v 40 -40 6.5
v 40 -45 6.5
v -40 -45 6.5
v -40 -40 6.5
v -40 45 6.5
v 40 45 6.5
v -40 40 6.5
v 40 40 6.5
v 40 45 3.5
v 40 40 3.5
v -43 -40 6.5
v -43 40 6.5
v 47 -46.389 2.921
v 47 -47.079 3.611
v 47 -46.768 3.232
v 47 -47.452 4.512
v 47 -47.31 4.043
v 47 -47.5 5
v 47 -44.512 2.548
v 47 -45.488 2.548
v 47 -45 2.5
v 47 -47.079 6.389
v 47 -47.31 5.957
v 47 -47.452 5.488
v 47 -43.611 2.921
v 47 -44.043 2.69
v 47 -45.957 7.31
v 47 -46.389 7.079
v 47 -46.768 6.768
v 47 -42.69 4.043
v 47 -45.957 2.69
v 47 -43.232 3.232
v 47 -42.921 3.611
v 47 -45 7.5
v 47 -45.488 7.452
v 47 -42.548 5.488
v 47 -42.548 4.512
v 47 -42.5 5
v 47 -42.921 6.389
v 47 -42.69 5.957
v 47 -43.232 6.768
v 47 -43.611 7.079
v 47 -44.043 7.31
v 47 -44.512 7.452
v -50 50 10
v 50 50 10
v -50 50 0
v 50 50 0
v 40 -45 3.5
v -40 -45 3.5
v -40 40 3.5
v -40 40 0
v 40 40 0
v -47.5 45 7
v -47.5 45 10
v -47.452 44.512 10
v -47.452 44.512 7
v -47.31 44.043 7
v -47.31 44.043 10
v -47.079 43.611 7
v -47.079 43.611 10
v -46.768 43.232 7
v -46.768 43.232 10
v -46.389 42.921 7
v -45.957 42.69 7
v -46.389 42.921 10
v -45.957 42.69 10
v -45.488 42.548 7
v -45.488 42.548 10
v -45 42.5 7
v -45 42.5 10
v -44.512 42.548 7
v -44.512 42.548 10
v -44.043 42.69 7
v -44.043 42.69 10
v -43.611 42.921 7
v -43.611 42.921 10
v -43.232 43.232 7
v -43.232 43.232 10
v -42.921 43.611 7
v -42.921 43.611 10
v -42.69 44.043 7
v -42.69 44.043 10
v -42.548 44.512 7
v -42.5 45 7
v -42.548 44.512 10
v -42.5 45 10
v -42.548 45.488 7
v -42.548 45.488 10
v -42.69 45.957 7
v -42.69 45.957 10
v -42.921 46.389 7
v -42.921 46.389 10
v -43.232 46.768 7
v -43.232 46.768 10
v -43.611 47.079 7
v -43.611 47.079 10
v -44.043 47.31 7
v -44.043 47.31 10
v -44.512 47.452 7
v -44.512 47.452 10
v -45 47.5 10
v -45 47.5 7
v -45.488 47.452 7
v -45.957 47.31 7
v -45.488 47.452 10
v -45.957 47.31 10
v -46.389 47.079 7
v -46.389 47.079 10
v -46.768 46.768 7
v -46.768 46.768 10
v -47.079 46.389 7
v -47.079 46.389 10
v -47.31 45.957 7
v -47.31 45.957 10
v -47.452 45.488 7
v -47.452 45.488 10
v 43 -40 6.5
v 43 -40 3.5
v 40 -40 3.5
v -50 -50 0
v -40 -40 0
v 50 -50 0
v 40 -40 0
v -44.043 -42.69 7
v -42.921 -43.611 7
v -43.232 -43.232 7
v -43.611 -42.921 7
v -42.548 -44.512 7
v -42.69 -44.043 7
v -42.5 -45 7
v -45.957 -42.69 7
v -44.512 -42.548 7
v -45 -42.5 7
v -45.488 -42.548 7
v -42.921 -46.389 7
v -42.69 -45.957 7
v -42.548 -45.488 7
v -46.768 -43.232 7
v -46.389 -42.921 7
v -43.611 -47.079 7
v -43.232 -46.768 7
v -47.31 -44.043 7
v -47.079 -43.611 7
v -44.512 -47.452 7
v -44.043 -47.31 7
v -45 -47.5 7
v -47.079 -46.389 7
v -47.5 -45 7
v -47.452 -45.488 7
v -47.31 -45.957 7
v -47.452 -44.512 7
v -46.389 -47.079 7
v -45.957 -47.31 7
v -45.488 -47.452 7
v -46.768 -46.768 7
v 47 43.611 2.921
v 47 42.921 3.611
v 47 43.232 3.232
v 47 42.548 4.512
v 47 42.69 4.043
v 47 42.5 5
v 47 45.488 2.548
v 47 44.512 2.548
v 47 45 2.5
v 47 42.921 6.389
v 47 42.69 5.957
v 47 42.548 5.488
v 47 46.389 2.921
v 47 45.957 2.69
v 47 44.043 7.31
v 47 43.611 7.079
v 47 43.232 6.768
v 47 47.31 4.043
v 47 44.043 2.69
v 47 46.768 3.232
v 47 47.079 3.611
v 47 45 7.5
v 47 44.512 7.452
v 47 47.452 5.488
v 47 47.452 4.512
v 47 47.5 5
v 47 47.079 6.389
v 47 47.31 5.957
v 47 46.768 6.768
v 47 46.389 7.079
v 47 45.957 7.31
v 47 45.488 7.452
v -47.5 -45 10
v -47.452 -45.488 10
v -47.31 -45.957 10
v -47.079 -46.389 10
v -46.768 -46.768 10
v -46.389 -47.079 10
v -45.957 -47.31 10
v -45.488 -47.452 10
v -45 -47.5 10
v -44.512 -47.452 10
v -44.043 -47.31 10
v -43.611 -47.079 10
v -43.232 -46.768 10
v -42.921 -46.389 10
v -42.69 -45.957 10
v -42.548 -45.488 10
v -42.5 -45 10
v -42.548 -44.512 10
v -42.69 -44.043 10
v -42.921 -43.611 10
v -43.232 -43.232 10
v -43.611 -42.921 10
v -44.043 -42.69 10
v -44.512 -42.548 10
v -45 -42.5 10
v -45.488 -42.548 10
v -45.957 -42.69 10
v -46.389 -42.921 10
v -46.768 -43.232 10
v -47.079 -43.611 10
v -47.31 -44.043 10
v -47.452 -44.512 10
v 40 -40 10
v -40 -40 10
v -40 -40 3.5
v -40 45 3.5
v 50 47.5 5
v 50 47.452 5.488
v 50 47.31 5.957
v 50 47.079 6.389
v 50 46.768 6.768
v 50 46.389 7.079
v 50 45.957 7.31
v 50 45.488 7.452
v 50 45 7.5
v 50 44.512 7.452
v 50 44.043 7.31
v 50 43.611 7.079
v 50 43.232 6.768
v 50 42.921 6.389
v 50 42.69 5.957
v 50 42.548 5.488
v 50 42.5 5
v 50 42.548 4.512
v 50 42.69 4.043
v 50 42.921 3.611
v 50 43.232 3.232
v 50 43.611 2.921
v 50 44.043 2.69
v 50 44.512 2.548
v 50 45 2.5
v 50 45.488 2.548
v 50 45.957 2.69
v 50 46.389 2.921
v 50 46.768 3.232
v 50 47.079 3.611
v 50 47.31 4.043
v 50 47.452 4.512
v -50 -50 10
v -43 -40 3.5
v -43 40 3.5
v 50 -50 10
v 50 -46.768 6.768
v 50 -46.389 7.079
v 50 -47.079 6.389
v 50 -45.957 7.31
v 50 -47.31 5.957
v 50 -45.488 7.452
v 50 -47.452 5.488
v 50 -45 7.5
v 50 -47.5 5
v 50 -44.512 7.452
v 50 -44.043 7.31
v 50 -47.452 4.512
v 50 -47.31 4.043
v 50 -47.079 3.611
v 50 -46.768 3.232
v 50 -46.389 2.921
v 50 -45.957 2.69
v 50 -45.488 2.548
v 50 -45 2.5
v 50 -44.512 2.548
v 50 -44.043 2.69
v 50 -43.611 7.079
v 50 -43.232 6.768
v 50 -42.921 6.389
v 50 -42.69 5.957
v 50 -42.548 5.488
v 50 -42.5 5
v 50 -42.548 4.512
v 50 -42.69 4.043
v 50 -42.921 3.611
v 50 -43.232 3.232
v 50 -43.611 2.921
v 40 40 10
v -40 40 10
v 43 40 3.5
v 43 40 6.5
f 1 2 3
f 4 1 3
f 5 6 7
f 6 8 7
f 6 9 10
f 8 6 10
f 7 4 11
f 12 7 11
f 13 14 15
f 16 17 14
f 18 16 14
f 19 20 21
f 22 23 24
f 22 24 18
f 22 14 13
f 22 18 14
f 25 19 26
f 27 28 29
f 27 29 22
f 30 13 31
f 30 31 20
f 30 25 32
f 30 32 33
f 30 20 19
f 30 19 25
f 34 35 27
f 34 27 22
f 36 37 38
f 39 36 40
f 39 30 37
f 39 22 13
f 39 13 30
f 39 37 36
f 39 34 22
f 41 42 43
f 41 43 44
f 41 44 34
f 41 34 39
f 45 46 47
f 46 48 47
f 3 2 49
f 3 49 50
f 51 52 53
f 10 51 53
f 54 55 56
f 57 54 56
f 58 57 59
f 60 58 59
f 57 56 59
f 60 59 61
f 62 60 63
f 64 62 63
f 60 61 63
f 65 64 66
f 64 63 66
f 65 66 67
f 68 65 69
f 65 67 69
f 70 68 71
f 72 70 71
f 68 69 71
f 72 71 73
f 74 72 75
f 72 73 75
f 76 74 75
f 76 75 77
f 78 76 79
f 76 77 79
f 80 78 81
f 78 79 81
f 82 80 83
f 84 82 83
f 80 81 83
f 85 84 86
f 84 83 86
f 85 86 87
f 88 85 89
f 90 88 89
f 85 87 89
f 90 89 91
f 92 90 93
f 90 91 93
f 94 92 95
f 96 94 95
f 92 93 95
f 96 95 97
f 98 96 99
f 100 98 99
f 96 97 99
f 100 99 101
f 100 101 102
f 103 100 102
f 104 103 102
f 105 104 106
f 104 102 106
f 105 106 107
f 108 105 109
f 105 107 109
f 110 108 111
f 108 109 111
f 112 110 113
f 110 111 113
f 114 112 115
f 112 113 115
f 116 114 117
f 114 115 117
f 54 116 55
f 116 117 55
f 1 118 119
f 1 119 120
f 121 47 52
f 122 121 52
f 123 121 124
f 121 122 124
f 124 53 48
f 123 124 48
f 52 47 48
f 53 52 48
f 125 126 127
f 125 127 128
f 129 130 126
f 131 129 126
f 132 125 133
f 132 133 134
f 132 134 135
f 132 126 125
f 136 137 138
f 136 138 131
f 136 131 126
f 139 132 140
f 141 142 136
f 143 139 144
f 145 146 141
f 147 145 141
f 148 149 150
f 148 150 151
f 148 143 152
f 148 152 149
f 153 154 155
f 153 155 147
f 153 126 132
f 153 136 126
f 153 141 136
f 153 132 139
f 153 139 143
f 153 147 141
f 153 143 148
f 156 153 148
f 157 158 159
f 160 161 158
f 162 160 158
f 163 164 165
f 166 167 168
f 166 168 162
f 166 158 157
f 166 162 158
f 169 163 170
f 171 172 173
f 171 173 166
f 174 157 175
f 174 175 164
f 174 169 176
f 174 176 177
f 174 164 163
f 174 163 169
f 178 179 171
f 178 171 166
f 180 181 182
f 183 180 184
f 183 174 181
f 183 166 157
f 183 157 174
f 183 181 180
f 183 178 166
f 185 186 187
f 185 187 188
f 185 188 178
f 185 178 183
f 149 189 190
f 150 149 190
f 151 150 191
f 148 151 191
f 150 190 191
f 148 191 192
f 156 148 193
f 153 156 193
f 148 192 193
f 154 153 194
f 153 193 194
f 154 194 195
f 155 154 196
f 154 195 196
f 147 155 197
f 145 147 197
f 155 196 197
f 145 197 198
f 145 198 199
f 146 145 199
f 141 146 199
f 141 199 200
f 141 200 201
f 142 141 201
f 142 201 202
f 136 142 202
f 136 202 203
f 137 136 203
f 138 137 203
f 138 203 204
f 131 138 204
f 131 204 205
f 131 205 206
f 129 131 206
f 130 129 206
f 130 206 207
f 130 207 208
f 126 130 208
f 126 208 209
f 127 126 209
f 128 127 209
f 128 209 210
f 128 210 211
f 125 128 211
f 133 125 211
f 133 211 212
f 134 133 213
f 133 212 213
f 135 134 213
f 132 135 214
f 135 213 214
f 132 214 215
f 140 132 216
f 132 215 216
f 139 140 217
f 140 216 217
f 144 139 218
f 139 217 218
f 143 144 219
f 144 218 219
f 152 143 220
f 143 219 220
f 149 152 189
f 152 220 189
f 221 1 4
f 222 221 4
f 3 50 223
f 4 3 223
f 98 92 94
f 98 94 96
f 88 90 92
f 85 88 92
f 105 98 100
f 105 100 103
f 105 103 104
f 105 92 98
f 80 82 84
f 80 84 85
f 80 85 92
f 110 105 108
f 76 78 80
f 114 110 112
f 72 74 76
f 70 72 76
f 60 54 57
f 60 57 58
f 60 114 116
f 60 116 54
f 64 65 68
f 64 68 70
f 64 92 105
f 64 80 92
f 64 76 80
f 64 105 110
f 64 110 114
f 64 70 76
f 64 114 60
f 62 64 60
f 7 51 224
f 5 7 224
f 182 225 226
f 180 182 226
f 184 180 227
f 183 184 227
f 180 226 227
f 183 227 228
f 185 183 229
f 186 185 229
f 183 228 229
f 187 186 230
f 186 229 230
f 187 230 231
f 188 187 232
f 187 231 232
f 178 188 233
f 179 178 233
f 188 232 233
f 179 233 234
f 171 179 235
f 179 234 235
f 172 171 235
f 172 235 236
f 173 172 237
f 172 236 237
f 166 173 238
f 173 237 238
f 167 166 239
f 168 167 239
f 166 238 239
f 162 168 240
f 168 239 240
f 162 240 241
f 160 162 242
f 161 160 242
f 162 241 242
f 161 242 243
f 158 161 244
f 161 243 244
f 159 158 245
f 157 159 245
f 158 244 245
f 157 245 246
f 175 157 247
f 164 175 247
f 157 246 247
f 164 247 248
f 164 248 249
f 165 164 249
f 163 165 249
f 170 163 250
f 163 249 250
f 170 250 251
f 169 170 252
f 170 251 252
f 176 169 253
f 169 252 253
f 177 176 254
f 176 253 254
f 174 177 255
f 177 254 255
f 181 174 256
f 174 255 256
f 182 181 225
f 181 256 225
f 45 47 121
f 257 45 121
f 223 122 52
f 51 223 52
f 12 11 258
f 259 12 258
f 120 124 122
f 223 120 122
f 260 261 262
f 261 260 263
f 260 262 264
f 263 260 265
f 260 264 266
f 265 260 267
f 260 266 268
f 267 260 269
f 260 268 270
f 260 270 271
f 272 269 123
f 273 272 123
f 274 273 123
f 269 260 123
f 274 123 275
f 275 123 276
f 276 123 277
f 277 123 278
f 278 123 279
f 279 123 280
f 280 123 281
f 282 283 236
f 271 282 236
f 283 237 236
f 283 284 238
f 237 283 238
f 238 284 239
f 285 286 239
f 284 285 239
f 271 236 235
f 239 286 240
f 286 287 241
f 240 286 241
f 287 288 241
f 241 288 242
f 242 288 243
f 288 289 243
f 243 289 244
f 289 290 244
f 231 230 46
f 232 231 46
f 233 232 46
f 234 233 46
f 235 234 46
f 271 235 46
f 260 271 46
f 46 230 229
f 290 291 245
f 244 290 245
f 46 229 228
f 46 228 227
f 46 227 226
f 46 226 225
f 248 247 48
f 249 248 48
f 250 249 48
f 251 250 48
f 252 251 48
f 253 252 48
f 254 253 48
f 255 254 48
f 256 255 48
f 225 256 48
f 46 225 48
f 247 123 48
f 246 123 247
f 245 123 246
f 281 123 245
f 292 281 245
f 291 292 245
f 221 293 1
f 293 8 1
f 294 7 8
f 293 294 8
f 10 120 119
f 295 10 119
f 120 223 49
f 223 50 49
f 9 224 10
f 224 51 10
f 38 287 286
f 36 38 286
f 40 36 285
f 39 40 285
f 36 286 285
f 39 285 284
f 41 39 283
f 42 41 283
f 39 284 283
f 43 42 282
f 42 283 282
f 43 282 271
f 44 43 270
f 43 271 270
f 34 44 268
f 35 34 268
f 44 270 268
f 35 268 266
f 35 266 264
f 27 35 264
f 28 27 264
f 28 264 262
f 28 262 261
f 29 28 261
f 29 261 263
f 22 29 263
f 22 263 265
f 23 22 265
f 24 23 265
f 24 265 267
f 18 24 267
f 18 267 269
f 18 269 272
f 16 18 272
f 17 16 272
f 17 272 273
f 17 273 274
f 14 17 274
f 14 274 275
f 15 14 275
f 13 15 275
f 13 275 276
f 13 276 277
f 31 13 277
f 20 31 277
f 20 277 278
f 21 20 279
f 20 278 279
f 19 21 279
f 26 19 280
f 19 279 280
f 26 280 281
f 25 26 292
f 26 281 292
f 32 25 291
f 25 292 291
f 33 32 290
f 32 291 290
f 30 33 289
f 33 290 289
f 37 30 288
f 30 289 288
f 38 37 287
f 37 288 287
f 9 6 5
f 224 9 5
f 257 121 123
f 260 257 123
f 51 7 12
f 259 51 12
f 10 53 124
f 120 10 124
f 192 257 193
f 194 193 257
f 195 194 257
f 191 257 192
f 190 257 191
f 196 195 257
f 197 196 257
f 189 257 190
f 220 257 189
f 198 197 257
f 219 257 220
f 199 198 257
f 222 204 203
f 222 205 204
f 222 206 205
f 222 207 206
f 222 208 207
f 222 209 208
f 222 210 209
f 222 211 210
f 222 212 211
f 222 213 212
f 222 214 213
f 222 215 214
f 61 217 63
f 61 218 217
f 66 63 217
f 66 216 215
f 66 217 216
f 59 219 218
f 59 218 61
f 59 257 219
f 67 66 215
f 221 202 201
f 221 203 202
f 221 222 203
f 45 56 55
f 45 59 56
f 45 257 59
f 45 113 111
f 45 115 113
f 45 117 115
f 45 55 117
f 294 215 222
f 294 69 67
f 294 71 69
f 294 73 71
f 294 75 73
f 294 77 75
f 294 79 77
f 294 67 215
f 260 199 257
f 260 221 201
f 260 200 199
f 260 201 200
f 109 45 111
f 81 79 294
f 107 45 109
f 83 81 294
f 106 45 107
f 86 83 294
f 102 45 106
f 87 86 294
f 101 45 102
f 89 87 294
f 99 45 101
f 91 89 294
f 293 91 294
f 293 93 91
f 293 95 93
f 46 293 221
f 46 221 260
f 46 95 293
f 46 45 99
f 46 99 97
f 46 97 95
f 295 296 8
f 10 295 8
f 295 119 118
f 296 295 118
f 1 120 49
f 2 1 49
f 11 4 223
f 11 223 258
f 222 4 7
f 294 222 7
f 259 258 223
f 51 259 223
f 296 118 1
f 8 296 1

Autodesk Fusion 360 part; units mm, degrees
sketch "Sketch1" plane through (0, 0, 0) normal (0, 0, 1) x (1, 0, 0)
  line L0 (50, 50) -> (-50, 50)
  line L1 (-50, 50) -> (-50, -50)
  line L2 (-50, -50) -> (50, -50)
  line L3 (50, -50) -> (50, 50)
  line L4 (50, 50) -> (-50, -50) construction
  line L5 (-50, 50) -> (50, -50) construction
  line L6 (40, -40) -> (-40, -40)
  line L7 (-40, -40) -> (-40, 40)
  line L8 (-40, 40) -> (40, 40)
  line L9 (40, 40) -> (40, -40)
  line L10 (40, -40) -> (-40, 40) construction
  line L11 (-40, -40) -> (40, 40) construction
  dimension "d1" = 100
  dimension "d2" = 100
  dimension "d3" = 80
  dimension "d4" = 80
extrude "Extrude1" add sketch "Sketch1" along normal blind 10
sketch "Sketch2" plane through (0, -40, 0) normal (0, 1, 0) x (-1, 0, 0)
  line L0 (-40, 0) -> (40, 0)
  line L1 (40, 0) -> (40, 10)
  line L2 (40, 10) -> (-40, 10)
  line L3 (-40, 10) -> (-40, 0)
  line L4 (0, 10) -> (0, 0) construction
  line L5 (-40, 5) -> (40, 5) construction
  line L6 (43, 3.5) -> (-43, 3.5)
  line L7 (-43, 3.5) -> (-43, 6.5)
  line L8 (-43, 6.5) -> (43, 6.5)
  line L9 (43, 6.5) -> (43, 3.5)
  line L10 (43, 3.5) -> (-43, 6.5) construction
  line L11 (-43, 3.5) -> (43, 6.5) construction
  point P0 (0, 5)
  dimension "d9" = 86
  dimension "d10" = 3
extrude "Extrude2" cut sketch "Sketch2" along normal blind 85 and the other way blind 5 contours L1 L3 L6 L8
extrude "Extrude3" cut sketch "Sketch2" along normal blind 80 contours L3 L6 L7 L8 | L1 L6 L8 L9
sketch "Sketch3" plane through (0, 0, 10) normal (0, 0, 1) x (-1, 0, 0)
  line L0 (40, -40) -> (-40, -40)
  line L1 (-40, -40) -> (-40, 40)
  line L2 (-40, 40) -> (40, 40)
  line L3 (40, 40) -> (40, -40)
  line L4 (-50, 50) -> (-50, -50)
  line L5 (-50, -50) -> (50, -50)
  line L6 (50, -50) -> (50, 50)
  line L7 (50, 50) -> (-50, 50)
  line L8 (40, -40) -> (40, -50) construction
  line L9 (40, -40) -> (50, -40) construction
  line L10 (45, -40) -> (45, -50) construction
  line L11 (40, -45) -> (50, -45) construction
  circle A0 centre (45, -45) radius 2.5
  circle A1 centre (45, 45) radius 2.5
  dimension "d17" = 5
  dimension "d20" = -90
  dimension "d21" = 90
extrude "Extrude4" cut sketch "Sketch3" against normal blind 3 contours A0 | A1
sketch "Sketch4" plane through (50, 0, 0) normal (1, 0, 0) x (0, 1, 0)
  line L0 (-50, 0) -> (50, 0)
  line L1 (50, 0) -> (50, 10)
  line L2 (50, 10) -> (-50, 10)
  line L3 (-50, 10) -> (-50, 0)
  line L4 (-40, 3.5) -> (-40, 6.5)
  line L5 (-40, 5) -> (-50, 5) construction
  circle A0 centre (-45, 5) radius 2.5
  circle A1 centre (0, 5) radius 2.5
  circle A2 centre (45, 5) radius 2.5
  dimension "d24" = 5
  dimension "d27" = 90
  dimension "d28" = 0
extrude "Extrude5" cut sketch "Sketch4" against normal blind 3 contours A0 | A2
equation "d9 = 80 mm + 6 mm"
equation "d30 = f8e7f7a2-a6e5-415b-bf69-f4a3084041c5"
